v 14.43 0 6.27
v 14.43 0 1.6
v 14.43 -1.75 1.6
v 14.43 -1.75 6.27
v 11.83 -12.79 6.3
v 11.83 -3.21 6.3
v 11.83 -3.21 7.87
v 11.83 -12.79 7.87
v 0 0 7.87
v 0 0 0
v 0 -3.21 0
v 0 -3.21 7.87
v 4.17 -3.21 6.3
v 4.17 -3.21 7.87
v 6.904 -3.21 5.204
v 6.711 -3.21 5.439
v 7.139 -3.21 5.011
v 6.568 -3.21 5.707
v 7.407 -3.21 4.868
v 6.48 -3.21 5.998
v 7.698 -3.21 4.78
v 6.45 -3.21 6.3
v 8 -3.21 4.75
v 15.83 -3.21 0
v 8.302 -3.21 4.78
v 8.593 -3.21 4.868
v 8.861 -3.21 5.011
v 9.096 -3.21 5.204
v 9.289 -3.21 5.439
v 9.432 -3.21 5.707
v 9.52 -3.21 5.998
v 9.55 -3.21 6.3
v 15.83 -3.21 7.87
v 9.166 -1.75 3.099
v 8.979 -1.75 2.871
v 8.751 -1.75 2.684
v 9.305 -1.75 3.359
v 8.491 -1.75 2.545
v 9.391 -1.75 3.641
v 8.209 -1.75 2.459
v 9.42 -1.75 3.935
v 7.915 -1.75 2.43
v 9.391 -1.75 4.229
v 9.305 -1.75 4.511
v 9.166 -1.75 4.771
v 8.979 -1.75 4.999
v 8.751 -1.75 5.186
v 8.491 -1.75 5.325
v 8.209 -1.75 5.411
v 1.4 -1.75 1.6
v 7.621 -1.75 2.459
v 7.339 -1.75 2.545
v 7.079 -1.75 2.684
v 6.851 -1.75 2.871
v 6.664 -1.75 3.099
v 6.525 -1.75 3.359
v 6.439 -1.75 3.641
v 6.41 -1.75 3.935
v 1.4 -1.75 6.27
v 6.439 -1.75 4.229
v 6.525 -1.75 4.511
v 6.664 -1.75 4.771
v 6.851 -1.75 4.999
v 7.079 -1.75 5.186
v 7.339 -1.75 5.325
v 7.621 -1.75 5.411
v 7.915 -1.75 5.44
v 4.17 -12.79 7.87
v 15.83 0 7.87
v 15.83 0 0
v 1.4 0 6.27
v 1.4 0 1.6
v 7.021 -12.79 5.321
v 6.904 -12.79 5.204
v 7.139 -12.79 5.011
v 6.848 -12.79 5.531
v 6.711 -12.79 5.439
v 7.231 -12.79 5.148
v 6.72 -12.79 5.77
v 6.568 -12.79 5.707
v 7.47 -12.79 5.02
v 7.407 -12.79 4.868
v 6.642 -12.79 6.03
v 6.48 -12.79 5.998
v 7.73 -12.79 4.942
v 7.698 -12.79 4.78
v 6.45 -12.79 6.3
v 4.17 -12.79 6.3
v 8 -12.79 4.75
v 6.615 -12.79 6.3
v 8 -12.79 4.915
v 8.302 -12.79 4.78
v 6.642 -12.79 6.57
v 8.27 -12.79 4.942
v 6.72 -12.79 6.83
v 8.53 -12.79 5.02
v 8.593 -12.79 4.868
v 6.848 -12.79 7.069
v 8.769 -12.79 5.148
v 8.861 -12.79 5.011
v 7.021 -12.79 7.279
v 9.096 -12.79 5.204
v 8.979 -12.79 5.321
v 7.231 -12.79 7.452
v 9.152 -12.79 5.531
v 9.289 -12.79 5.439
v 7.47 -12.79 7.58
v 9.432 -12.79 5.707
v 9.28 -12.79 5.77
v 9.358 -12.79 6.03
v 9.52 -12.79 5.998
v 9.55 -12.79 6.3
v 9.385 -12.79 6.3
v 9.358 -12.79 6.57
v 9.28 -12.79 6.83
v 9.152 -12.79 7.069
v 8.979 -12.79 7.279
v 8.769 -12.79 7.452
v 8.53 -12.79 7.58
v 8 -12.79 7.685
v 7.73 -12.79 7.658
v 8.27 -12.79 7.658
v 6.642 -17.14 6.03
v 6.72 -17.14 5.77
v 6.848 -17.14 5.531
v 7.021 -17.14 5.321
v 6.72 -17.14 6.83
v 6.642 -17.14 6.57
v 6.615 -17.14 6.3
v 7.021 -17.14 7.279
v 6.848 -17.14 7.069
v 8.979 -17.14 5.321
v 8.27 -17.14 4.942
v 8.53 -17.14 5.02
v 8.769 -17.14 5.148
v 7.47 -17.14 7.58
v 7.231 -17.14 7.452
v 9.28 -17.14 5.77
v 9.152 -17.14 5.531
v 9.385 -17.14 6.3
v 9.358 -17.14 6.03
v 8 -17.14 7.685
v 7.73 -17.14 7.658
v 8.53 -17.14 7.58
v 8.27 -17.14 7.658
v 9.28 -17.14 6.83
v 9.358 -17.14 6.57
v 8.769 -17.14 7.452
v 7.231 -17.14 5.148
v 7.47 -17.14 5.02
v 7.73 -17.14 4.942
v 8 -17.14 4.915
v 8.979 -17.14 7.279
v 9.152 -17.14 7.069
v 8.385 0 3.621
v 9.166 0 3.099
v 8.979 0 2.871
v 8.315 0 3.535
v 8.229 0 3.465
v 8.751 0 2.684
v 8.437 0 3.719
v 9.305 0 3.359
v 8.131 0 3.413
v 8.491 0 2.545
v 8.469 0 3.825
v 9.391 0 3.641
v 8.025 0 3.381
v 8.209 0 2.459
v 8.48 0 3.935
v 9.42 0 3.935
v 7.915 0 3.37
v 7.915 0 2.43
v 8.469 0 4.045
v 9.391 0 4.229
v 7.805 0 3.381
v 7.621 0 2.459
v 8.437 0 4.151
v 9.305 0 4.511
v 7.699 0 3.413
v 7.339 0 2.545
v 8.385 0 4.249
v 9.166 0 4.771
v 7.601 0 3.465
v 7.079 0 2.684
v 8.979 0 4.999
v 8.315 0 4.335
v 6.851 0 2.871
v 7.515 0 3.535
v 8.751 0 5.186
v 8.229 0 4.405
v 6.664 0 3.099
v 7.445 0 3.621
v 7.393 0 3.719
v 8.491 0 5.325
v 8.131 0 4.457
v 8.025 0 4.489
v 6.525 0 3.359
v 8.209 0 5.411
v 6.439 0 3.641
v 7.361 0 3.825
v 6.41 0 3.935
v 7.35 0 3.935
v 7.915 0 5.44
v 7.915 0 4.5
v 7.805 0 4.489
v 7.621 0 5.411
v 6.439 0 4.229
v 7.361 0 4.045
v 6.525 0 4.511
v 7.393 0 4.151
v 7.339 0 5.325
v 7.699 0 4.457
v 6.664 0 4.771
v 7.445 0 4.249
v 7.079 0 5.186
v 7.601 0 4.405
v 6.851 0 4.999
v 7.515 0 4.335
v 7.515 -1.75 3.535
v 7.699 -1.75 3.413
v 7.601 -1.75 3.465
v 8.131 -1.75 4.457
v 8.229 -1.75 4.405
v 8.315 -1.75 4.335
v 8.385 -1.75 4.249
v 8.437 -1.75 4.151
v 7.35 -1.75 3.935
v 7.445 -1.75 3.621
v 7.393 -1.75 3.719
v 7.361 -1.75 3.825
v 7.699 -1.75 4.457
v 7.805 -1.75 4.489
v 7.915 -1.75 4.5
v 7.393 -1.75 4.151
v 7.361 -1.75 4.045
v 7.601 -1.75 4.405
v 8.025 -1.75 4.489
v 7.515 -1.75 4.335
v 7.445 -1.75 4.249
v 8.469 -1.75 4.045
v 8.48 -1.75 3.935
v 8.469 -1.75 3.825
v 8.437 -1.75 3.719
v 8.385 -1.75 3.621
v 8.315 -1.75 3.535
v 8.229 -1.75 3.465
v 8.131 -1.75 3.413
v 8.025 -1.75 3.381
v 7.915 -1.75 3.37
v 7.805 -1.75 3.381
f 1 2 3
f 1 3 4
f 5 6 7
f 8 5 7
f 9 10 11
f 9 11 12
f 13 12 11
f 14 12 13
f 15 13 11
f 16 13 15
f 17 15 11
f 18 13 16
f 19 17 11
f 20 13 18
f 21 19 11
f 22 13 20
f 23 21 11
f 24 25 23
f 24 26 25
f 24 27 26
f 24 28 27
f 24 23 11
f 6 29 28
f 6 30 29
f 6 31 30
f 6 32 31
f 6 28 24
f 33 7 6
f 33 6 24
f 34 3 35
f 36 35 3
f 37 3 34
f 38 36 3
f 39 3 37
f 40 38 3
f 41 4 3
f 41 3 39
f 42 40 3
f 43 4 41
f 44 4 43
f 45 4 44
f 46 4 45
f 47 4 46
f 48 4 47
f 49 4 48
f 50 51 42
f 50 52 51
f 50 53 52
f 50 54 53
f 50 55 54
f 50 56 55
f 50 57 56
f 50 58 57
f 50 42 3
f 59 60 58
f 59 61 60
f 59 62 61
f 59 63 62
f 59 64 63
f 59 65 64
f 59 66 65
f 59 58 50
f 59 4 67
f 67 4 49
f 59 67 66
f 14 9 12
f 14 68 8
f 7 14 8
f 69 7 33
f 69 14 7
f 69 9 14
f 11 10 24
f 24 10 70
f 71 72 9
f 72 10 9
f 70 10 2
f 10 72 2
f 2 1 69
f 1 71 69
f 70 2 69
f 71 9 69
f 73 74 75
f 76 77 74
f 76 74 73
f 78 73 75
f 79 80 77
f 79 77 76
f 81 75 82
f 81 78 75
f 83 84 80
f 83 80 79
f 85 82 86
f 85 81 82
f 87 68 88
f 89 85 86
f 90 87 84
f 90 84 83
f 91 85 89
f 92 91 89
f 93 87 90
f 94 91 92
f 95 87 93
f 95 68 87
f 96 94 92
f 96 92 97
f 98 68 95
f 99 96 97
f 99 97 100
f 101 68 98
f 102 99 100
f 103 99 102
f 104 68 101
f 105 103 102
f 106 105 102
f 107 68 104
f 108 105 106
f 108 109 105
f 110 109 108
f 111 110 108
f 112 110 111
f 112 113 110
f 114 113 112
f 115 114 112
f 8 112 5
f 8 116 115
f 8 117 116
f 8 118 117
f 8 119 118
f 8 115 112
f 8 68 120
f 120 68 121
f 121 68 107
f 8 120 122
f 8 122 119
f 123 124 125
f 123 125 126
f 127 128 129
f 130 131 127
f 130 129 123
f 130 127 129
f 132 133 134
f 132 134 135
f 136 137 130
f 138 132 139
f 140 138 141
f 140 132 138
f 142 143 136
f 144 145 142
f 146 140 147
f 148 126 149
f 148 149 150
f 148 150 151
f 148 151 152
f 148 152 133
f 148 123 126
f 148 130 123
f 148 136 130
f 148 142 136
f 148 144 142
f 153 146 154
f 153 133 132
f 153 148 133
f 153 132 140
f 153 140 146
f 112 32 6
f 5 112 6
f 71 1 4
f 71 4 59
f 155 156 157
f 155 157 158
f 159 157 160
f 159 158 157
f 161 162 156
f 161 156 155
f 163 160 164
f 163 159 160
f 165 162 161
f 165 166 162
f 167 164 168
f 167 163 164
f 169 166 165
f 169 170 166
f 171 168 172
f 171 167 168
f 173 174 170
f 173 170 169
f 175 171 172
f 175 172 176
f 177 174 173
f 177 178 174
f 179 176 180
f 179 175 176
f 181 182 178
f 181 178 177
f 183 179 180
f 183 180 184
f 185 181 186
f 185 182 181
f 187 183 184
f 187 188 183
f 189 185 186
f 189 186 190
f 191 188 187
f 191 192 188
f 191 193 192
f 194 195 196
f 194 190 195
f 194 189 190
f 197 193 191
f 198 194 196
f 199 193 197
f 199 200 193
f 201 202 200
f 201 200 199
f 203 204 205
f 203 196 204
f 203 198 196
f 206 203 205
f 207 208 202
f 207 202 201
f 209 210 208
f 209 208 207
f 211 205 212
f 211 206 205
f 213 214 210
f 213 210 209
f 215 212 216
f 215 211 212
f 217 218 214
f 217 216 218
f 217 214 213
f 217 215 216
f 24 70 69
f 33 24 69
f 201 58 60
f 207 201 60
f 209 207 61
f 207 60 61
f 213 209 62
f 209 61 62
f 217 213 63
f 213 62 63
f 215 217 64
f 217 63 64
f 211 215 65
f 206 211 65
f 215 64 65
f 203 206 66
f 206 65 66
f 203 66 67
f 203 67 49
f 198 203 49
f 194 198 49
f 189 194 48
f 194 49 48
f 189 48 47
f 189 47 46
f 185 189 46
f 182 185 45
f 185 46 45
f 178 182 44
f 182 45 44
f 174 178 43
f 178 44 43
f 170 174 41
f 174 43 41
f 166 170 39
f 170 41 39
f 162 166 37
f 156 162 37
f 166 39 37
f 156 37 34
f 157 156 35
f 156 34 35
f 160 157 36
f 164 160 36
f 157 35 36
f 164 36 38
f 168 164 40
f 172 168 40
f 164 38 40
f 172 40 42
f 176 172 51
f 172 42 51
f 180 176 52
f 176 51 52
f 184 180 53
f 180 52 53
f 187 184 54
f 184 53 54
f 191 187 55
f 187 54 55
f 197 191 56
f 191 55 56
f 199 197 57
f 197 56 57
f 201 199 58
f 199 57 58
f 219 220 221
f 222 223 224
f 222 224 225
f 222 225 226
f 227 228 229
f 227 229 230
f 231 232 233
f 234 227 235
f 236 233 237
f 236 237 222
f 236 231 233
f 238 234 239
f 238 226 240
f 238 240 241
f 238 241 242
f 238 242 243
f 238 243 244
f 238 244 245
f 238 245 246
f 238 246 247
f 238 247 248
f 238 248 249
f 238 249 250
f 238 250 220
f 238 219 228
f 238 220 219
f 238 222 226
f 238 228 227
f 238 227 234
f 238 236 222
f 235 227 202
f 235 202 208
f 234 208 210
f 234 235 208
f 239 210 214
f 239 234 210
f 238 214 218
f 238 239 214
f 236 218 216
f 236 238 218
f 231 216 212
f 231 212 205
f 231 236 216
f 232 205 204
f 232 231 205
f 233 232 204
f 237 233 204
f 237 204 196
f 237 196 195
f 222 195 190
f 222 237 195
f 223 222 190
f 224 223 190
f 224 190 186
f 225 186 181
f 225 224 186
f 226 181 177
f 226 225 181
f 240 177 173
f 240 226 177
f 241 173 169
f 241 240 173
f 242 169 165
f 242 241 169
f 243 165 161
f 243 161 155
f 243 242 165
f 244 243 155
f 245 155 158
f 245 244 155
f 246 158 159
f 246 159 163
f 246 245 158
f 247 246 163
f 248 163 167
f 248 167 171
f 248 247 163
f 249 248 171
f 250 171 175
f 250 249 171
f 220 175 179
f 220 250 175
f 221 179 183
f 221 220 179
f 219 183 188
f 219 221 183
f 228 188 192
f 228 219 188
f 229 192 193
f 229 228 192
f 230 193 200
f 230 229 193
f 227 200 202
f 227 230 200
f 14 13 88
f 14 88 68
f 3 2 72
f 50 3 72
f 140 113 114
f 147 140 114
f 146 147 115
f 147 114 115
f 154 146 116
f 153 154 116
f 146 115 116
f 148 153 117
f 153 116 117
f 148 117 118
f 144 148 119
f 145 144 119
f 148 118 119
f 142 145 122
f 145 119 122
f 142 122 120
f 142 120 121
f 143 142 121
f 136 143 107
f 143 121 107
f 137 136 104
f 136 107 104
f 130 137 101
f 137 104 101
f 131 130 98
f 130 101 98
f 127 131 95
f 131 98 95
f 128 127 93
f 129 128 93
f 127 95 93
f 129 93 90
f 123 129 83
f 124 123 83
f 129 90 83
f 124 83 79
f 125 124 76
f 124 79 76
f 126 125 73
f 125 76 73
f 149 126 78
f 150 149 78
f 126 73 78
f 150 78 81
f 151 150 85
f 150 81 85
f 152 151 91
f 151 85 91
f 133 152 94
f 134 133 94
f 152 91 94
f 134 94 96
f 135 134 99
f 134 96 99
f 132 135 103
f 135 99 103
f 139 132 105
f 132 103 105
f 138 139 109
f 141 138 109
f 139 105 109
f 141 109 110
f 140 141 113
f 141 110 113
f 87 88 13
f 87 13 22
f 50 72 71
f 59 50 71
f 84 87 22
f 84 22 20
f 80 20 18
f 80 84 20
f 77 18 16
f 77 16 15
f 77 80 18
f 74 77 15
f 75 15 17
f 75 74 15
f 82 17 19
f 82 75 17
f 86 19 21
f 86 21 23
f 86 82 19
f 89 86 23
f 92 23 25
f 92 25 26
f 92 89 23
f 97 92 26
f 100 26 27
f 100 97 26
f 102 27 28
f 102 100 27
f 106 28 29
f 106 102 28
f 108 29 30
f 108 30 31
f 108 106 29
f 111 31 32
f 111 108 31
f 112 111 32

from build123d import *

# Parameters (mm, degrees)
F0_W      = 15.83
F0_H      = 7.87
F1_DEPTH  = 3.21
F2_W      = 13.03
F2_H      = 4.67
F3_DEPTH  = 1.75
F4_R      = 1.505
F4_R_2    = 0.565
F5_DEPTH  = 1.75
F6_W      = 7.66
F6_H      = 1.57
F7_DEPTH  = 9.58
F8_R      = 1.55
F9_DEPTH  = 9.58
F10_R     = 1.385
F11_DEPTH = 4.35


with BuildPart() as f1:
    # F0 (on Front) → F1 (new body)
    with BuildSketch(Plane.XZ):
        with Locations((7.915, 3.935)):
            Rectangle(F0_W, F0_H)
    extrude(amount=F1_DEPTH)

    # F2 (on face) → F3 (cut)
    with BuildSketch(Plane(origin=(0, 0, 0), x_dir=(-1, 0, 0), z_dir=(0, 1, 0))):
        with Locations((-7.915, 3.935)):
            Rectangle(F2_W, F2_H)
    extrude(amount=-F3_DEPTH, mode=Mode.SUBTRACT)

    # F4 (on face) → F5 (join, through all)
    with BuildSketch(Plane(origin=(0, -1.75, 0), x_dir=(-1, 0, 0), z_dir=(0, 1, 0))):
        with Locations((-7.915, 3.935)):
            Circle(F4_R)
        with Locations((-7.915, 3.935)):
            Circle(F4_R_2, mode=Mode.SUBTRACT)
    extrude(amount=F5_DEPTH)

    # F6 (on face) → F7 (join)
    with BuildSketch(Plane.XZ.offset(3.21)):
        with Locations((8, 7.085)):
            Rectangle(F6_W, F6_H)
    extrude(amount=F7_DEPTH)

    # F8 (on face) → F9 (join, through all)
    with BuildSketch(Plane.XZ.offset(12.79)):
        with Locations((8, 6.3)):
            Circle(F8_R)
    extrude(amount=-F9_DEPTH)

    # F10 (on face) → F11 (join)
    with BuildSketch(Plane.XZ.offset(12.79)):
        with Locations((8, 6.3)):
            Circle(F10_R)
    extrude(amount=F11_DEPTH)


solid = f1.part
